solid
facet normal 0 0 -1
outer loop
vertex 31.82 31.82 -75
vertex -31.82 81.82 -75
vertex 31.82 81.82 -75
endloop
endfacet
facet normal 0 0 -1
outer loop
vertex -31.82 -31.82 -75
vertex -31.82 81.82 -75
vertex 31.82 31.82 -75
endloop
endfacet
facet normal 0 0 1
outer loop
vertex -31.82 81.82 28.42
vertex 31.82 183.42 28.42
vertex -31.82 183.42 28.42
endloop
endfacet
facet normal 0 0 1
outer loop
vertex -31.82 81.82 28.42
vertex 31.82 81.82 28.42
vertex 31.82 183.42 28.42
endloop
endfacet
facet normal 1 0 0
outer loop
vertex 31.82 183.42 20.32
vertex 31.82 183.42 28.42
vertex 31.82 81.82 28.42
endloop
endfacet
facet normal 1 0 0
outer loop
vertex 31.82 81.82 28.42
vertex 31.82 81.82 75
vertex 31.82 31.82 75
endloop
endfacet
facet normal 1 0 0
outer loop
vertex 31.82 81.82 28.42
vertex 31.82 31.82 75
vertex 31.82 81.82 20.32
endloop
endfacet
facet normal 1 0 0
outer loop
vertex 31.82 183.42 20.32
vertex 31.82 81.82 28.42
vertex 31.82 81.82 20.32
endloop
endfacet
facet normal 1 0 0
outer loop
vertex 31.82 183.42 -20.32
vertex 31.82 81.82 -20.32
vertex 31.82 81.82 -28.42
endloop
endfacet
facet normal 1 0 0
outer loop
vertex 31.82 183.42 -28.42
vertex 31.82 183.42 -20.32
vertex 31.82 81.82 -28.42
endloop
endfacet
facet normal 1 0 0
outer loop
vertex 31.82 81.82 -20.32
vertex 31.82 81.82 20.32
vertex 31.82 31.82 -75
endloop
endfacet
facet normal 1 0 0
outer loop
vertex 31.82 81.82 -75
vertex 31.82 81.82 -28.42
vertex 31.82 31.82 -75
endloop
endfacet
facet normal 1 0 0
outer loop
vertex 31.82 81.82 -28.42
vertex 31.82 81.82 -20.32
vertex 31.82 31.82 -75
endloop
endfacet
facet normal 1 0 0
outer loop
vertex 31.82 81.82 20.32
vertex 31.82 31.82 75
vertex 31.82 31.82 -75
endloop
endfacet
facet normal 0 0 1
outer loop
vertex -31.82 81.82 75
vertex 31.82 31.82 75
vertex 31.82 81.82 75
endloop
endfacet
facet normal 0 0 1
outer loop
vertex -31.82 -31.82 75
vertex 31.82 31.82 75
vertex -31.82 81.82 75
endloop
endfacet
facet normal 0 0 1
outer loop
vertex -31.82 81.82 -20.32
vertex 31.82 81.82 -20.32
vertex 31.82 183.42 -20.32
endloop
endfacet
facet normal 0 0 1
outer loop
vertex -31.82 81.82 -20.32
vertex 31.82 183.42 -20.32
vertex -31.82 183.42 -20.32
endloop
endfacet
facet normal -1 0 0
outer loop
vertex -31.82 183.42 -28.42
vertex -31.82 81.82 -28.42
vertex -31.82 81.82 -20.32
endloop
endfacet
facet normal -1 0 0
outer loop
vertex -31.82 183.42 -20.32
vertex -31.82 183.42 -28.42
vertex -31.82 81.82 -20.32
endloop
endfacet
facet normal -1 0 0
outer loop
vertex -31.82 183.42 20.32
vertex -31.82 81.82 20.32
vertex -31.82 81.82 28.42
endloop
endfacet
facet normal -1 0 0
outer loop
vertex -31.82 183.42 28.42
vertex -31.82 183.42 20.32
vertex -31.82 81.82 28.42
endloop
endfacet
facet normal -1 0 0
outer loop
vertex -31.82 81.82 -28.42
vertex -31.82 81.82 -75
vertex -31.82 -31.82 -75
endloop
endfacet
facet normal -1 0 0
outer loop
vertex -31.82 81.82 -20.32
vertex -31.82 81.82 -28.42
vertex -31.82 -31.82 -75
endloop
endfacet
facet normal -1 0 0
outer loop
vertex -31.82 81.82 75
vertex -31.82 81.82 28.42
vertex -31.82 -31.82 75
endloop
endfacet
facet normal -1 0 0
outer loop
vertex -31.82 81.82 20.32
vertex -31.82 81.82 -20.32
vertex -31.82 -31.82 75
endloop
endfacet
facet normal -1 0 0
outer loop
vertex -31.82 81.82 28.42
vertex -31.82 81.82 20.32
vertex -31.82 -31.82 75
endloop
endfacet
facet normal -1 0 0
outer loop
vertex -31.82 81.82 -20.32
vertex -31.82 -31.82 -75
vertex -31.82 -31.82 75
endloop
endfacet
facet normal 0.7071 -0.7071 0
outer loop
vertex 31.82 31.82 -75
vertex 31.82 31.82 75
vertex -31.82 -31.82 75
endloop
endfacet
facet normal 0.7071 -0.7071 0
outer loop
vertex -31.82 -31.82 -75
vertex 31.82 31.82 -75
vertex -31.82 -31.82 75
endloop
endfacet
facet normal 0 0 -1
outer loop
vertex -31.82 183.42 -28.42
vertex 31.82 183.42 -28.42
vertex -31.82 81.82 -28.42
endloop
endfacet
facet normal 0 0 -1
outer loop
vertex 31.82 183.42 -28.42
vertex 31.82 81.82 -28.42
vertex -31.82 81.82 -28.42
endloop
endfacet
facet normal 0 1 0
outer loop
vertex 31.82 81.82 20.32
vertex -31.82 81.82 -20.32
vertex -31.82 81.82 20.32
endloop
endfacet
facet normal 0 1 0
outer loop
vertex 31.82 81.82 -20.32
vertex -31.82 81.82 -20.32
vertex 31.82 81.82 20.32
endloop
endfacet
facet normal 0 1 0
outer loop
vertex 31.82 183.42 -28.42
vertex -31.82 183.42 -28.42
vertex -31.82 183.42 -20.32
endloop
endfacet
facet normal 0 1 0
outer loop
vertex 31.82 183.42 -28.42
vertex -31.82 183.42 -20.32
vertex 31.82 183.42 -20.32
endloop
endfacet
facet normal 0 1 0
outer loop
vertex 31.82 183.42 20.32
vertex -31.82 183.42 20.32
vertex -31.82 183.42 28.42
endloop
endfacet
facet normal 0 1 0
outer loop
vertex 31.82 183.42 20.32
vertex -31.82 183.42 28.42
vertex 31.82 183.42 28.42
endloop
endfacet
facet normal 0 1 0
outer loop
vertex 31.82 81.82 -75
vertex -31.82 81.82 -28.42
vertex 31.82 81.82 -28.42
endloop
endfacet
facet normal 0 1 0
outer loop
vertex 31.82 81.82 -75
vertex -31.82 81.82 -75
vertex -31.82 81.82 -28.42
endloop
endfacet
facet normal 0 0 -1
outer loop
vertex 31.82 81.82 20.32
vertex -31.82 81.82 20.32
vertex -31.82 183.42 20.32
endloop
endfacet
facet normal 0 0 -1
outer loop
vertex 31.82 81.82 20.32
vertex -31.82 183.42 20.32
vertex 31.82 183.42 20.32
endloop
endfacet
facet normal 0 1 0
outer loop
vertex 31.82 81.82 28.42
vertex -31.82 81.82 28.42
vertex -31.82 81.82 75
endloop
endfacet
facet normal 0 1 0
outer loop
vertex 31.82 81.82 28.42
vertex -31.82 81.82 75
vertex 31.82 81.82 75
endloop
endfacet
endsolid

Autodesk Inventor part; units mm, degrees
ref_plane "YZ Plane" through (0, 0, 0) normal (1, 0, 0) x (0, 1, 0)
ref_plane "XZ Plane" through (0, 0, 0) normal (0, 1, 0) x (-1, 0, 0)
ref_plane "XY Plane" through (0, 0, 0) normal (0, 0, 1) x (1, 0, 0)
sketch "Sketch55" plane through (0, 0, 0) normal (0, 0, 1) x (1, 0, 0)
  line L0 (0, 0) -> (0, -53.4597) construction
  line L1 (0, 0) -> (31.8198, 31.8198)
  line L2 (0, 0) -> (89.157, 0) construction
  line L3 (0, 0) -> (-31.8198, -31.8198)
  line L4 (31.8198, 31.8198) -> (-31.8198, 31.8198)
  line L5 (-31.8198, 31.8198) -> (-31.8198, -31.8198)
  dimension "d252" = 45
extrude "Extrusion25" add sketch "Sketch55" along normal mid plane 150
sketch "Sketch56" plane through (-31.8198, 31.8198, 75) normal (0, 1, 0) x (1, 0, 0)
  line L0 (0, 150) -> (63.6396, 150) projected
  line L1 (63.6396, 0) -> (63.6396, 150) projected
  line L2 (0, 150) -> (0, 0) projected
  line L3 (63.6396, 0) -> (0, 0) projected
  line L4 (0, 150) -> (63.6396, 150)
  line L5 (63.6396, 150) -> (63.6396, 0)
  line L6 (63.6396, 0) -> (0, 0)
  line L7 (0, 0) -> (0, 150)
  point P0 (31.8198, 75)
extrude "Extrusion26" add sketch "Sketch56" along normal blind 50
sketch "Sketch57" plane through (-31.8198, 81.8198, 75) normal (0, 1, 0) x (1, 0, 0)
  line L0 (63.6396, 150) -> (0, 150) projected
  line L1 (63.6396, 0) -> (63.6396, 150) projected
  line L2 (0, 0) -> (63.6396, 0) projected
  line L3 (0, 150) -> (0, 0) projected
  line L4 (0, 54.68) -> (63.6396, 54.68)
  line L5 (63.6396, 54.68) -> (63.6396, 95.32)
  line L6 (63.6396, 95.32) -> (0, 95.32)
  line L7 (0, 95.32) -> (0, 54.68)
  line L8 (0, 54.68) -> (63.6396, 95.32) construction
  line L9 (63.6396, 54.68) -> (0, 95.32) construction
  line L10 (0, 95.32) -> (63.6396, 95.32)
  line L11 (63.6396, 95.32) -> (63.6396, 103.42)
  line L12 (63.6396, 103.42) -> (0, 103.42)
  line L13 (0, 103.42) -> (0, 95.32)
  line L14 (0, 54.68) -> (63.6396, 54.68)
  line L15 (63.6396, 54.68) -> (63.6396, 46.58)
  line L16 (63.6396, 46.58) -> (0, 46.58)
  line L17 (0, 46.58) -> (0, 54.68)
  point P0 (31.8198, 75)
  point P1 (0, 46.58)
  point P2 (0, 103.42)
  point P3 (0, 95.32)
  dimension "d259" = 8.1
  dimension "d260" = 8.1
  dimension "d261" = 40.64
extrude "Extrusion27" add sketch "Sketch57" along normal blind 101.6 contours L1 L6 L3 L12 | L1 L16 L3 L4
equation "\"d261\" = twoByFourWidth"
equation "\"wallThickness\" = 8"
equation "\"twoByFourWidth\" = 40.64"
equation "\"twoByFourDepth\" = 84.1375"
equation "\"azimuth\" = -15deg"
equation "\"elevation\" = 20deg"
equation "\"depthOfExtrusionForMatingToLowerHalf\" = 12.5"
equation "\"depthForWasherForMatingToCase\" = 14"
equation "\"topWallThickness\" = 8"
equation "\"widthOfCase\" = 149"
equation "\"sideWallThickness\" = 8"
equation "\"caseHeight\" = 125"
equation "\"bottomWallThickness\" = 8"
properties part number "upperBracketForSquareBracket" material "PC/ABS Plastic"
